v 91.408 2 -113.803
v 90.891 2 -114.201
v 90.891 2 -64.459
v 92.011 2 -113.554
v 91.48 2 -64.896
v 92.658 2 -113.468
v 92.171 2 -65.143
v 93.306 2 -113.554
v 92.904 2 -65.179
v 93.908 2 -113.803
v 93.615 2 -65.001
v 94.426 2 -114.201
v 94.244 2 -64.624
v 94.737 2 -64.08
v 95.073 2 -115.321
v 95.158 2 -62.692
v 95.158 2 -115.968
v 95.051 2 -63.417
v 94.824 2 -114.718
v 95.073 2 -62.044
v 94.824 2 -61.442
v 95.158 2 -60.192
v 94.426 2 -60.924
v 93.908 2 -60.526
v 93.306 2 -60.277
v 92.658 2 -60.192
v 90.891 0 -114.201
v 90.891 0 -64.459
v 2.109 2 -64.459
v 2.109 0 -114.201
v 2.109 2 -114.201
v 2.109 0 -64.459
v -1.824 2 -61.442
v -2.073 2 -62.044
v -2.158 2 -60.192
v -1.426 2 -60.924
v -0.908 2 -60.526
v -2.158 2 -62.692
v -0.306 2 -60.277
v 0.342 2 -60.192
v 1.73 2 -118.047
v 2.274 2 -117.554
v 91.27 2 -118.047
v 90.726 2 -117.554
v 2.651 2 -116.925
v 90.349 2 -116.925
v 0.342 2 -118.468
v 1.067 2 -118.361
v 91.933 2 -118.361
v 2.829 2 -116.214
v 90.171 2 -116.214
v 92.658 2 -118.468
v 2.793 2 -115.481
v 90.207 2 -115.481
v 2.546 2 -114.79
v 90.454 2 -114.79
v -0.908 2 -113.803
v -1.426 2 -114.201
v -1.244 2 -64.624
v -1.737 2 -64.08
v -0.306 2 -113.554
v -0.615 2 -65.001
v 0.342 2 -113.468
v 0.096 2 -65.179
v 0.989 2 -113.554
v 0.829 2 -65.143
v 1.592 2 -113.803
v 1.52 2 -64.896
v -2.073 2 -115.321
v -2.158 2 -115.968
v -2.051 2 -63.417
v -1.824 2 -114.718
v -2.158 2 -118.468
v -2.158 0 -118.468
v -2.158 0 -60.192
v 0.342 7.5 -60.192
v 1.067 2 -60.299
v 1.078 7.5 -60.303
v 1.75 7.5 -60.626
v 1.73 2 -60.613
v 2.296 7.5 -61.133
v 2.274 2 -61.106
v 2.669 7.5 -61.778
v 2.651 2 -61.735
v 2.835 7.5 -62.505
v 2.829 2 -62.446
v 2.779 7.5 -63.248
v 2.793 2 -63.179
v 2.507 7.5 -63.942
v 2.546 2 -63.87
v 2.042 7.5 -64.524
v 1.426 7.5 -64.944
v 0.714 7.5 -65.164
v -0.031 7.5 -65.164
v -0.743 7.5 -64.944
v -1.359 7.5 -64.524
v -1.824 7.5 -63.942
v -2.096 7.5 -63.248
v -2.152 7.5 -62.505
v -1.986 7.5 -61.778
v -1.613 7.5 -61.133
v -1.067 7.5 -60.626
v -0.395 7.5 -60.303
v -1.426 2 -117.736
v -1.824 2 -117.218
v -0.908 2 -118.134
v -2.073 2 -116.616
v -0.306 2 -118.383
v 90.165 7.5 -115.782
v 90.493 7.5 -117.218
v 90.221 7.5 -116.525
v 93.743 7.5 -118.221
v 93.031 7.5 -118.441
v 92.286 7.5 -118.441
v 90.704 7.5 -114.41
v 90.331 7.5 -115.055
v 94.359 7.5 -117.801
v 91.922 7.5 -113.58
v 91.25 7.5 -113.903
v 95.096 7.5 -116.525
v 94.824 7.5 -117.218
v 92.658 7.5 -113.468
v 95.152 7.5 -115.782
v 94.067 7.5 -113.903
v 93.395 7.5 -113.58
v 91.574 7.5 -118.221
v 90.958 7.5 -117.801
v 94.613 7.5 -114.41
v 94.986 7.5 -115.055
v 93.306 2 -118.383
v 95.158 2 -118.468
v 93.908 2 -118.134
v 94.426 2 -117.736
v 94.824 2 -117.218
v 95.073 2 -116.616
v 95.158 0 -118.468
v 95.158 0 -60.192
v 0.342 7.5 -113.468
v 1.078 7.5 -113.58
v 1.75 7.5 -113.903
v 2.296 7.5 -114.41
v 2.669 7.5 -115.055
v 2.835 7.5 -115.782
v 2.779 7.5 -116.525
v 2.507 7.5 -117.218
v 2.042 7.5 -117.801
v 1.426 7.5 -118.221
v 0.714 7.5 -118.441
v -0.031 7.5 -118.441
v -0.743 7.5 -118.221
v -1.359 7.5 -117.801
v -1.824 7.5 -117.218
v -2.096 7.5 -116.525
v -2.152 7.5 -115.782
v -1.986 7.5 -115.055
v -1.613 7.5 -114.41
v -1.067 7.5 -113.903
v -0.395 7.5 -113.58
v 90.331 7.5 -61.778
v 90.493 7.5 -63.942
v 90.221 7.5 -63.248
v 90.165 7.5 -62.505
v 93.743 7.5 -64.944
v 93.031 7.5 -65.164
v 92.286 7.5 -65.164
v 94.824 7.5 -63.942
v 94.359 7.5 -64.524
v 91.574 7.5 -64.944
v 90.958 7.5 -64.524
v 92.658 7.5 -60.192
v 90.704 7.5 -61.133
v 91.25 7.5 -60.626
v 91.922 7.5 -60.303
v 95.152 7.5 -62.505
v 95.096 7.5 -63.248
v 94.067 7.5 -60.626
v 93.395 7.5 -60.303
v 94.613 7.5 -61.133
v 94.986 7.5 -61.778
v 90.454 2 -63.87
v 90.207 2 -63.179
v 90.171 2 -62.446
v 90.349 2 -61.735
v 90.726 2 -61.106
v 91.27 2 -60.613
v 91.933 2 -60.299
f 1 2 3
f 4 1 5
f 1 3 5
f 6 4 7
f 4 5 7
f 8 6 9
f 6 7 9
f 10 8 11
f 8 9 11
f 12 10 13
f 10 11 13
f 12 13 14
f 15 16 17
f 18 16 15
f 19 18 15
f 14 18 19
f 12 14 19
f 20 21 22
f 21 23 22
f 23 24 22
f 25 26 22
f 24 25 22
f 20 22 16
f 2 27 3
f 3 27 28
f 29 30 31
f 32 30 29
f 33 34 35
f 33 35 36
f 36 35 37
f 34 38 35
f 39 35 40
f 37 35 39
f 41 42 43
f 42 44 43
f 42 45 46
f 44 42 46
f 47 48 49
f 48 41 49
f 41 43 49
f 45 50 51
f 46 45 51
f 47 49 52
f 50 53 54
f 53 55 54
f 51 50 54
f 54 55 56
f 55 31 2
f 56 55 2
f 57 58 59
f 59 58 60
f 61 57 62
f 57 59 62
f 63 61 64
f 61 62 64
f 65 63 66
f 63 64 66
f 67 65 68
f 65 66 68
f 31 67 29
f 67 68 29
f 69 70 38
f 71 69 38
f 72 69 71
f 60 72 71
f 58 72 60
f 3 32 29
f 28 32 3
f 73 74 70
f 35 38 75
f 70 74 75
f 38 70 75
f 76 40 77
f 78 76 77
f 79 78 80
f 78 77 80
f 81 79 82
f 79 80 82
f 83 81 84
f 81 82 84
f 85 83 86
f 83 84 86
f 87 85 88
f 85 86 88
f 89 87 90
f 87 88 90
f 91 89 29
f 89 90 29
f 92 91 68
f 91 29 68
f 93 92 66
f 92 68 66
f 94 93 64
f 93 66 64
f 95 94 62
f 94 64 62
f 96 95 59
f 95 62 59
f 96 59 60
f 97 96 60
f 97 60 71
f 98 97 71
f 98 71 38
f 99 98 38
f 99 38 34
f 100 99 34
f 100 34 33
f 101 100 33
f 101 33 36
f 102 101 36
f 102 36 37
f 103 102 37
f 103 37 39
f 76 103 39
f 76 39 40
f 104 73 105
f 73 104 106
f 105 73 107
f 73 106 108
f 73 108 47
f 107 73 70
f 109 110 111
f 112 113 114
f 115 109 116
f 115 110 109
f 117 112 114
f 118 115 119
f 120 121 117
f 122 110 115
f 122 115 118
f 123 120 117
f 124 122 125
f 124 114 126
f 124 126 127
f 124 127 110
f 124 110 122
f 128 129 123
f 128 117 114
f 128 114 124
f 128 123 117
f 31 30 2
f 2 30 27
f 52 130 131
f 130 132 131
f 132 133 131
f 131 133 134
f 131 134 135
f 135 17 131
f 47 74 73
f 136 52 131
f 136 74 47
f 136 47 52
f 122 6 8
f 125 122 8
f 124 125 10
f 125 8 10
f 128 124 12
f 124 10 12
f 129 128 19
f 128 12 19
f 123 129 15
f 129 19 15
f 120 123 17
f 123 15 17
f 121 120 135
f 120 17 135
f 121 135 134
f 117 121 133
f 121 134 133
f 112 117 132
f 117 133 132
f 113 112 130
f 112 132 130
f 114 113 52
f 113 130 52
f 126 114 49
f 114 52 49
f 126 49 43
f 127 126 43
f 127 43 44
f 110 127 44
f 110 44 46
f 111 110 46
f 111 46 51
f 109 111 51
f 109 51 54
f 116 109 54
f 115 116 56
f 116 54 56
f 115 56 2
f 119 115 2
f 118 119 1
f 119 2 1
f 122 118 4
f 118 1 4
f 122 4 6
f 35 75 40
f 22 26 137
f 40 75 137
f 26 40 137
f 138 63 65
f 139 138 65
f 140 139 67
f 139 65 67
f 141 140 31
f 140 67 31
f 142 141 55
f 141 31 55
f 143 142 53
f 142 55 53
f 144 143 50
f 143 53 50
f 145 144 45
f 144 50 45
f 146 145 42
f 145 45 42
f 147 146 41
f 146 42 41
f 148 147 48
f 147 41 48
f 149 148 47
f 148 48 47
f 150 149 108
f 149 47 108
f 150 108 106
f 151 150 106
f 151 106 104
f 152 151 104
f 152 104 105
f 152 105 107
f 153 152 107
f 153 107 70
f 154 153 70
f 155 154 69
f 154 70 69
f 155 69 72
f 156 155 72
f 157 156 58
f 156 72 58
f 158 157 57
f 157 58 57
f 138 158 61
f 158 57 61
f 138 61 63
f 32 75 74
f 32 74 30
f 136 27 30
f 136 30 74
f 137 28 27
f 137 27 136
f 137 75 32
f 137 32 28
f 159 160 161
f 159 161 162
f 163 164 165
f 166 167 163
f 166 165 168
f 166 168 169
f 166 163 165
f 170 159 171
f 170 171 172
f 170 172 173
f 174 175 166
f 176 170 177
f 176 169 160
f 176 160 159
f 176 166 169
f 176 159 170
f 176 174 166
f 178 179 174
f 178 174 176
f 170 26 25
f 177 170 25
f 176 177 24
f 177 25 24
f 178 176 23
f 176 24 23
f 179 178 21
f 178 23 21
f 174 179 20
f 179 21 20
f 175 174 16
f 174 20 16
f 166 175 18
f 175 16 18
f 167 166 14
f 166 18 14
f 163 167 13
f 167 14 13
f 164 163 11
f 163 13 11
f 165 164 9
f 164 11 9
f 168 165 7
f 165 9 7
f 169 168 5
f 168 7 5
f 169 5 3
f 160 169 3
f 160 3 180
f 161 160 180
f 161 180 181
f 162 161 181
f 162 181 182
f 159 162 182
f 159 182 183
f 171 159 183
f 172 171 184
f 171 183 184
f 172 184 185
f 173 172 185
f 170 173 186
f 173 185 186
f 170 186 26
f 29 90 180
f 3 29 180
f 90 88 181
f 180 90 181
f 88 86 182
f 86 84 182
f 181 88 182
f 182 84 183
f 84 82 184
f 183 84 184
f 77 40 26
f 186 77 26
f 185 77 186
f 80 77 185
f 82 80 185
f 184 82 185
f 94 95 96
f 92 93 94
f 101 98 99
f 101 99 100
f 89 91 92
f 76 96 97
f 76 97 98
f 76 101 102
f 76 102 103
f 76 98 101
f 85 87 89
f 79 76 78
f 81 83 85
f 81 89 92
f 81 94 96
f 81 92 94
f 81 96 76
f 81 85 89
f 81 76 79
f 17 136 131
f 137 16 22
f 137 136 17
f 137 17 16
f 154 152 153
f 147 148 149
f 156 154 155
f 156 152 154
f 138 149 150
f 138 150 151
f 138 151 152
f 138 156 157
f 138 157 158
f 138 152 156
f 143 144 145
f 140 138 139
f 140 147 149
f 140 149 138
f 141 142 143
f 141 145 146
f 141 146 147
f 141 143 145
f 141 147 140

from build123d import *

# Parameters (mm, degrees)
SKETCH4_R           = 2.5
SKETCH4_R_2         = 1.8415
BOSS_EXTRUDE4_DEPTH = 7.5
SKETCH5_W           = 97.316999936
SKETCH5_H           = 58.277
SKETCH5_W_2         = 88.78146603
SKETCH5_H_2         = 49.741466094
BOSS_EXTRUDE5_DEPTH = 2


with BuildPart() as part:
    # Sketch4 → Boss-Extrude4 (new body)
    with BuildSketch(Plane(origin=(0, 0, 0), x_dir=(1, 0, 0), z_dir=(0, 1, 0))):
        with Locations(Location((92.6585, 62.6915, 0), (0, 0, 270))):
            Circle(SKETCH4_R)
        with Locations((92.6585, 62.6915)):
            Circle(SKETCH4_R_2, mode=Mode.SUBTRACT)
        with Locations((92.6585, 62.6915)):
            Circle(SKETCH4_R_2)
        with Locations(Location((0.341500064, 62.6915, 0), (0, 0, 270))):
            Circle(SKETCH4_R)
        with Locations((0.341500064, 62.6915)):
            Circle(SKETCH4_R_2, mode=Mode.SUBTRACT)
        with Locations((0.341500064, 62.6915)):
            Circle(SKETCH4_R_2)
        with Locations(Location((0.341500064, 115.9685, 0), (0, 0, 270))):
            Circle(SKETCH4_R)
        with Locations((0.341500064, 115.9685)):
            Circle(SKETCH4_R_2, mode=Mode.SUBTRACT)
        with Locations((0.341500064, 115.9685)):
            Circle(SKETCH4_R_2)
        with Locations(Location((92.6585, 115.9685, 0), (0, 0, 270))):
            Circle(SKETCH4_R)
        with Locations((92.6585, 115.9685)):
            Circle(SKETCH4_R_2, mode=Mode.SUBTRACT)
        with Locations((92.6585, 115.9685)):
            Circle(SKETCH4_R_2)
    extrude(amount=BOSS_EXTRUDE4_DEPTH)

    # Sketch5 → Boss-Extrude5 (add)
    with BuildSketch(Plane.XZ):
        with Locations((46.500000032, -89.33)):
            Rectangle(SKETCH5_W, SKETCH5_H)
        with Locations((46.500000032, -89.33)):
            Rectangle(SKETCH5_W_2, SKETCH5_H_2, mode=Mode.SUBTRACT)
    extrude(amount=-BOSS_EXTRUDE5_DEPTH)


solid = part.part
